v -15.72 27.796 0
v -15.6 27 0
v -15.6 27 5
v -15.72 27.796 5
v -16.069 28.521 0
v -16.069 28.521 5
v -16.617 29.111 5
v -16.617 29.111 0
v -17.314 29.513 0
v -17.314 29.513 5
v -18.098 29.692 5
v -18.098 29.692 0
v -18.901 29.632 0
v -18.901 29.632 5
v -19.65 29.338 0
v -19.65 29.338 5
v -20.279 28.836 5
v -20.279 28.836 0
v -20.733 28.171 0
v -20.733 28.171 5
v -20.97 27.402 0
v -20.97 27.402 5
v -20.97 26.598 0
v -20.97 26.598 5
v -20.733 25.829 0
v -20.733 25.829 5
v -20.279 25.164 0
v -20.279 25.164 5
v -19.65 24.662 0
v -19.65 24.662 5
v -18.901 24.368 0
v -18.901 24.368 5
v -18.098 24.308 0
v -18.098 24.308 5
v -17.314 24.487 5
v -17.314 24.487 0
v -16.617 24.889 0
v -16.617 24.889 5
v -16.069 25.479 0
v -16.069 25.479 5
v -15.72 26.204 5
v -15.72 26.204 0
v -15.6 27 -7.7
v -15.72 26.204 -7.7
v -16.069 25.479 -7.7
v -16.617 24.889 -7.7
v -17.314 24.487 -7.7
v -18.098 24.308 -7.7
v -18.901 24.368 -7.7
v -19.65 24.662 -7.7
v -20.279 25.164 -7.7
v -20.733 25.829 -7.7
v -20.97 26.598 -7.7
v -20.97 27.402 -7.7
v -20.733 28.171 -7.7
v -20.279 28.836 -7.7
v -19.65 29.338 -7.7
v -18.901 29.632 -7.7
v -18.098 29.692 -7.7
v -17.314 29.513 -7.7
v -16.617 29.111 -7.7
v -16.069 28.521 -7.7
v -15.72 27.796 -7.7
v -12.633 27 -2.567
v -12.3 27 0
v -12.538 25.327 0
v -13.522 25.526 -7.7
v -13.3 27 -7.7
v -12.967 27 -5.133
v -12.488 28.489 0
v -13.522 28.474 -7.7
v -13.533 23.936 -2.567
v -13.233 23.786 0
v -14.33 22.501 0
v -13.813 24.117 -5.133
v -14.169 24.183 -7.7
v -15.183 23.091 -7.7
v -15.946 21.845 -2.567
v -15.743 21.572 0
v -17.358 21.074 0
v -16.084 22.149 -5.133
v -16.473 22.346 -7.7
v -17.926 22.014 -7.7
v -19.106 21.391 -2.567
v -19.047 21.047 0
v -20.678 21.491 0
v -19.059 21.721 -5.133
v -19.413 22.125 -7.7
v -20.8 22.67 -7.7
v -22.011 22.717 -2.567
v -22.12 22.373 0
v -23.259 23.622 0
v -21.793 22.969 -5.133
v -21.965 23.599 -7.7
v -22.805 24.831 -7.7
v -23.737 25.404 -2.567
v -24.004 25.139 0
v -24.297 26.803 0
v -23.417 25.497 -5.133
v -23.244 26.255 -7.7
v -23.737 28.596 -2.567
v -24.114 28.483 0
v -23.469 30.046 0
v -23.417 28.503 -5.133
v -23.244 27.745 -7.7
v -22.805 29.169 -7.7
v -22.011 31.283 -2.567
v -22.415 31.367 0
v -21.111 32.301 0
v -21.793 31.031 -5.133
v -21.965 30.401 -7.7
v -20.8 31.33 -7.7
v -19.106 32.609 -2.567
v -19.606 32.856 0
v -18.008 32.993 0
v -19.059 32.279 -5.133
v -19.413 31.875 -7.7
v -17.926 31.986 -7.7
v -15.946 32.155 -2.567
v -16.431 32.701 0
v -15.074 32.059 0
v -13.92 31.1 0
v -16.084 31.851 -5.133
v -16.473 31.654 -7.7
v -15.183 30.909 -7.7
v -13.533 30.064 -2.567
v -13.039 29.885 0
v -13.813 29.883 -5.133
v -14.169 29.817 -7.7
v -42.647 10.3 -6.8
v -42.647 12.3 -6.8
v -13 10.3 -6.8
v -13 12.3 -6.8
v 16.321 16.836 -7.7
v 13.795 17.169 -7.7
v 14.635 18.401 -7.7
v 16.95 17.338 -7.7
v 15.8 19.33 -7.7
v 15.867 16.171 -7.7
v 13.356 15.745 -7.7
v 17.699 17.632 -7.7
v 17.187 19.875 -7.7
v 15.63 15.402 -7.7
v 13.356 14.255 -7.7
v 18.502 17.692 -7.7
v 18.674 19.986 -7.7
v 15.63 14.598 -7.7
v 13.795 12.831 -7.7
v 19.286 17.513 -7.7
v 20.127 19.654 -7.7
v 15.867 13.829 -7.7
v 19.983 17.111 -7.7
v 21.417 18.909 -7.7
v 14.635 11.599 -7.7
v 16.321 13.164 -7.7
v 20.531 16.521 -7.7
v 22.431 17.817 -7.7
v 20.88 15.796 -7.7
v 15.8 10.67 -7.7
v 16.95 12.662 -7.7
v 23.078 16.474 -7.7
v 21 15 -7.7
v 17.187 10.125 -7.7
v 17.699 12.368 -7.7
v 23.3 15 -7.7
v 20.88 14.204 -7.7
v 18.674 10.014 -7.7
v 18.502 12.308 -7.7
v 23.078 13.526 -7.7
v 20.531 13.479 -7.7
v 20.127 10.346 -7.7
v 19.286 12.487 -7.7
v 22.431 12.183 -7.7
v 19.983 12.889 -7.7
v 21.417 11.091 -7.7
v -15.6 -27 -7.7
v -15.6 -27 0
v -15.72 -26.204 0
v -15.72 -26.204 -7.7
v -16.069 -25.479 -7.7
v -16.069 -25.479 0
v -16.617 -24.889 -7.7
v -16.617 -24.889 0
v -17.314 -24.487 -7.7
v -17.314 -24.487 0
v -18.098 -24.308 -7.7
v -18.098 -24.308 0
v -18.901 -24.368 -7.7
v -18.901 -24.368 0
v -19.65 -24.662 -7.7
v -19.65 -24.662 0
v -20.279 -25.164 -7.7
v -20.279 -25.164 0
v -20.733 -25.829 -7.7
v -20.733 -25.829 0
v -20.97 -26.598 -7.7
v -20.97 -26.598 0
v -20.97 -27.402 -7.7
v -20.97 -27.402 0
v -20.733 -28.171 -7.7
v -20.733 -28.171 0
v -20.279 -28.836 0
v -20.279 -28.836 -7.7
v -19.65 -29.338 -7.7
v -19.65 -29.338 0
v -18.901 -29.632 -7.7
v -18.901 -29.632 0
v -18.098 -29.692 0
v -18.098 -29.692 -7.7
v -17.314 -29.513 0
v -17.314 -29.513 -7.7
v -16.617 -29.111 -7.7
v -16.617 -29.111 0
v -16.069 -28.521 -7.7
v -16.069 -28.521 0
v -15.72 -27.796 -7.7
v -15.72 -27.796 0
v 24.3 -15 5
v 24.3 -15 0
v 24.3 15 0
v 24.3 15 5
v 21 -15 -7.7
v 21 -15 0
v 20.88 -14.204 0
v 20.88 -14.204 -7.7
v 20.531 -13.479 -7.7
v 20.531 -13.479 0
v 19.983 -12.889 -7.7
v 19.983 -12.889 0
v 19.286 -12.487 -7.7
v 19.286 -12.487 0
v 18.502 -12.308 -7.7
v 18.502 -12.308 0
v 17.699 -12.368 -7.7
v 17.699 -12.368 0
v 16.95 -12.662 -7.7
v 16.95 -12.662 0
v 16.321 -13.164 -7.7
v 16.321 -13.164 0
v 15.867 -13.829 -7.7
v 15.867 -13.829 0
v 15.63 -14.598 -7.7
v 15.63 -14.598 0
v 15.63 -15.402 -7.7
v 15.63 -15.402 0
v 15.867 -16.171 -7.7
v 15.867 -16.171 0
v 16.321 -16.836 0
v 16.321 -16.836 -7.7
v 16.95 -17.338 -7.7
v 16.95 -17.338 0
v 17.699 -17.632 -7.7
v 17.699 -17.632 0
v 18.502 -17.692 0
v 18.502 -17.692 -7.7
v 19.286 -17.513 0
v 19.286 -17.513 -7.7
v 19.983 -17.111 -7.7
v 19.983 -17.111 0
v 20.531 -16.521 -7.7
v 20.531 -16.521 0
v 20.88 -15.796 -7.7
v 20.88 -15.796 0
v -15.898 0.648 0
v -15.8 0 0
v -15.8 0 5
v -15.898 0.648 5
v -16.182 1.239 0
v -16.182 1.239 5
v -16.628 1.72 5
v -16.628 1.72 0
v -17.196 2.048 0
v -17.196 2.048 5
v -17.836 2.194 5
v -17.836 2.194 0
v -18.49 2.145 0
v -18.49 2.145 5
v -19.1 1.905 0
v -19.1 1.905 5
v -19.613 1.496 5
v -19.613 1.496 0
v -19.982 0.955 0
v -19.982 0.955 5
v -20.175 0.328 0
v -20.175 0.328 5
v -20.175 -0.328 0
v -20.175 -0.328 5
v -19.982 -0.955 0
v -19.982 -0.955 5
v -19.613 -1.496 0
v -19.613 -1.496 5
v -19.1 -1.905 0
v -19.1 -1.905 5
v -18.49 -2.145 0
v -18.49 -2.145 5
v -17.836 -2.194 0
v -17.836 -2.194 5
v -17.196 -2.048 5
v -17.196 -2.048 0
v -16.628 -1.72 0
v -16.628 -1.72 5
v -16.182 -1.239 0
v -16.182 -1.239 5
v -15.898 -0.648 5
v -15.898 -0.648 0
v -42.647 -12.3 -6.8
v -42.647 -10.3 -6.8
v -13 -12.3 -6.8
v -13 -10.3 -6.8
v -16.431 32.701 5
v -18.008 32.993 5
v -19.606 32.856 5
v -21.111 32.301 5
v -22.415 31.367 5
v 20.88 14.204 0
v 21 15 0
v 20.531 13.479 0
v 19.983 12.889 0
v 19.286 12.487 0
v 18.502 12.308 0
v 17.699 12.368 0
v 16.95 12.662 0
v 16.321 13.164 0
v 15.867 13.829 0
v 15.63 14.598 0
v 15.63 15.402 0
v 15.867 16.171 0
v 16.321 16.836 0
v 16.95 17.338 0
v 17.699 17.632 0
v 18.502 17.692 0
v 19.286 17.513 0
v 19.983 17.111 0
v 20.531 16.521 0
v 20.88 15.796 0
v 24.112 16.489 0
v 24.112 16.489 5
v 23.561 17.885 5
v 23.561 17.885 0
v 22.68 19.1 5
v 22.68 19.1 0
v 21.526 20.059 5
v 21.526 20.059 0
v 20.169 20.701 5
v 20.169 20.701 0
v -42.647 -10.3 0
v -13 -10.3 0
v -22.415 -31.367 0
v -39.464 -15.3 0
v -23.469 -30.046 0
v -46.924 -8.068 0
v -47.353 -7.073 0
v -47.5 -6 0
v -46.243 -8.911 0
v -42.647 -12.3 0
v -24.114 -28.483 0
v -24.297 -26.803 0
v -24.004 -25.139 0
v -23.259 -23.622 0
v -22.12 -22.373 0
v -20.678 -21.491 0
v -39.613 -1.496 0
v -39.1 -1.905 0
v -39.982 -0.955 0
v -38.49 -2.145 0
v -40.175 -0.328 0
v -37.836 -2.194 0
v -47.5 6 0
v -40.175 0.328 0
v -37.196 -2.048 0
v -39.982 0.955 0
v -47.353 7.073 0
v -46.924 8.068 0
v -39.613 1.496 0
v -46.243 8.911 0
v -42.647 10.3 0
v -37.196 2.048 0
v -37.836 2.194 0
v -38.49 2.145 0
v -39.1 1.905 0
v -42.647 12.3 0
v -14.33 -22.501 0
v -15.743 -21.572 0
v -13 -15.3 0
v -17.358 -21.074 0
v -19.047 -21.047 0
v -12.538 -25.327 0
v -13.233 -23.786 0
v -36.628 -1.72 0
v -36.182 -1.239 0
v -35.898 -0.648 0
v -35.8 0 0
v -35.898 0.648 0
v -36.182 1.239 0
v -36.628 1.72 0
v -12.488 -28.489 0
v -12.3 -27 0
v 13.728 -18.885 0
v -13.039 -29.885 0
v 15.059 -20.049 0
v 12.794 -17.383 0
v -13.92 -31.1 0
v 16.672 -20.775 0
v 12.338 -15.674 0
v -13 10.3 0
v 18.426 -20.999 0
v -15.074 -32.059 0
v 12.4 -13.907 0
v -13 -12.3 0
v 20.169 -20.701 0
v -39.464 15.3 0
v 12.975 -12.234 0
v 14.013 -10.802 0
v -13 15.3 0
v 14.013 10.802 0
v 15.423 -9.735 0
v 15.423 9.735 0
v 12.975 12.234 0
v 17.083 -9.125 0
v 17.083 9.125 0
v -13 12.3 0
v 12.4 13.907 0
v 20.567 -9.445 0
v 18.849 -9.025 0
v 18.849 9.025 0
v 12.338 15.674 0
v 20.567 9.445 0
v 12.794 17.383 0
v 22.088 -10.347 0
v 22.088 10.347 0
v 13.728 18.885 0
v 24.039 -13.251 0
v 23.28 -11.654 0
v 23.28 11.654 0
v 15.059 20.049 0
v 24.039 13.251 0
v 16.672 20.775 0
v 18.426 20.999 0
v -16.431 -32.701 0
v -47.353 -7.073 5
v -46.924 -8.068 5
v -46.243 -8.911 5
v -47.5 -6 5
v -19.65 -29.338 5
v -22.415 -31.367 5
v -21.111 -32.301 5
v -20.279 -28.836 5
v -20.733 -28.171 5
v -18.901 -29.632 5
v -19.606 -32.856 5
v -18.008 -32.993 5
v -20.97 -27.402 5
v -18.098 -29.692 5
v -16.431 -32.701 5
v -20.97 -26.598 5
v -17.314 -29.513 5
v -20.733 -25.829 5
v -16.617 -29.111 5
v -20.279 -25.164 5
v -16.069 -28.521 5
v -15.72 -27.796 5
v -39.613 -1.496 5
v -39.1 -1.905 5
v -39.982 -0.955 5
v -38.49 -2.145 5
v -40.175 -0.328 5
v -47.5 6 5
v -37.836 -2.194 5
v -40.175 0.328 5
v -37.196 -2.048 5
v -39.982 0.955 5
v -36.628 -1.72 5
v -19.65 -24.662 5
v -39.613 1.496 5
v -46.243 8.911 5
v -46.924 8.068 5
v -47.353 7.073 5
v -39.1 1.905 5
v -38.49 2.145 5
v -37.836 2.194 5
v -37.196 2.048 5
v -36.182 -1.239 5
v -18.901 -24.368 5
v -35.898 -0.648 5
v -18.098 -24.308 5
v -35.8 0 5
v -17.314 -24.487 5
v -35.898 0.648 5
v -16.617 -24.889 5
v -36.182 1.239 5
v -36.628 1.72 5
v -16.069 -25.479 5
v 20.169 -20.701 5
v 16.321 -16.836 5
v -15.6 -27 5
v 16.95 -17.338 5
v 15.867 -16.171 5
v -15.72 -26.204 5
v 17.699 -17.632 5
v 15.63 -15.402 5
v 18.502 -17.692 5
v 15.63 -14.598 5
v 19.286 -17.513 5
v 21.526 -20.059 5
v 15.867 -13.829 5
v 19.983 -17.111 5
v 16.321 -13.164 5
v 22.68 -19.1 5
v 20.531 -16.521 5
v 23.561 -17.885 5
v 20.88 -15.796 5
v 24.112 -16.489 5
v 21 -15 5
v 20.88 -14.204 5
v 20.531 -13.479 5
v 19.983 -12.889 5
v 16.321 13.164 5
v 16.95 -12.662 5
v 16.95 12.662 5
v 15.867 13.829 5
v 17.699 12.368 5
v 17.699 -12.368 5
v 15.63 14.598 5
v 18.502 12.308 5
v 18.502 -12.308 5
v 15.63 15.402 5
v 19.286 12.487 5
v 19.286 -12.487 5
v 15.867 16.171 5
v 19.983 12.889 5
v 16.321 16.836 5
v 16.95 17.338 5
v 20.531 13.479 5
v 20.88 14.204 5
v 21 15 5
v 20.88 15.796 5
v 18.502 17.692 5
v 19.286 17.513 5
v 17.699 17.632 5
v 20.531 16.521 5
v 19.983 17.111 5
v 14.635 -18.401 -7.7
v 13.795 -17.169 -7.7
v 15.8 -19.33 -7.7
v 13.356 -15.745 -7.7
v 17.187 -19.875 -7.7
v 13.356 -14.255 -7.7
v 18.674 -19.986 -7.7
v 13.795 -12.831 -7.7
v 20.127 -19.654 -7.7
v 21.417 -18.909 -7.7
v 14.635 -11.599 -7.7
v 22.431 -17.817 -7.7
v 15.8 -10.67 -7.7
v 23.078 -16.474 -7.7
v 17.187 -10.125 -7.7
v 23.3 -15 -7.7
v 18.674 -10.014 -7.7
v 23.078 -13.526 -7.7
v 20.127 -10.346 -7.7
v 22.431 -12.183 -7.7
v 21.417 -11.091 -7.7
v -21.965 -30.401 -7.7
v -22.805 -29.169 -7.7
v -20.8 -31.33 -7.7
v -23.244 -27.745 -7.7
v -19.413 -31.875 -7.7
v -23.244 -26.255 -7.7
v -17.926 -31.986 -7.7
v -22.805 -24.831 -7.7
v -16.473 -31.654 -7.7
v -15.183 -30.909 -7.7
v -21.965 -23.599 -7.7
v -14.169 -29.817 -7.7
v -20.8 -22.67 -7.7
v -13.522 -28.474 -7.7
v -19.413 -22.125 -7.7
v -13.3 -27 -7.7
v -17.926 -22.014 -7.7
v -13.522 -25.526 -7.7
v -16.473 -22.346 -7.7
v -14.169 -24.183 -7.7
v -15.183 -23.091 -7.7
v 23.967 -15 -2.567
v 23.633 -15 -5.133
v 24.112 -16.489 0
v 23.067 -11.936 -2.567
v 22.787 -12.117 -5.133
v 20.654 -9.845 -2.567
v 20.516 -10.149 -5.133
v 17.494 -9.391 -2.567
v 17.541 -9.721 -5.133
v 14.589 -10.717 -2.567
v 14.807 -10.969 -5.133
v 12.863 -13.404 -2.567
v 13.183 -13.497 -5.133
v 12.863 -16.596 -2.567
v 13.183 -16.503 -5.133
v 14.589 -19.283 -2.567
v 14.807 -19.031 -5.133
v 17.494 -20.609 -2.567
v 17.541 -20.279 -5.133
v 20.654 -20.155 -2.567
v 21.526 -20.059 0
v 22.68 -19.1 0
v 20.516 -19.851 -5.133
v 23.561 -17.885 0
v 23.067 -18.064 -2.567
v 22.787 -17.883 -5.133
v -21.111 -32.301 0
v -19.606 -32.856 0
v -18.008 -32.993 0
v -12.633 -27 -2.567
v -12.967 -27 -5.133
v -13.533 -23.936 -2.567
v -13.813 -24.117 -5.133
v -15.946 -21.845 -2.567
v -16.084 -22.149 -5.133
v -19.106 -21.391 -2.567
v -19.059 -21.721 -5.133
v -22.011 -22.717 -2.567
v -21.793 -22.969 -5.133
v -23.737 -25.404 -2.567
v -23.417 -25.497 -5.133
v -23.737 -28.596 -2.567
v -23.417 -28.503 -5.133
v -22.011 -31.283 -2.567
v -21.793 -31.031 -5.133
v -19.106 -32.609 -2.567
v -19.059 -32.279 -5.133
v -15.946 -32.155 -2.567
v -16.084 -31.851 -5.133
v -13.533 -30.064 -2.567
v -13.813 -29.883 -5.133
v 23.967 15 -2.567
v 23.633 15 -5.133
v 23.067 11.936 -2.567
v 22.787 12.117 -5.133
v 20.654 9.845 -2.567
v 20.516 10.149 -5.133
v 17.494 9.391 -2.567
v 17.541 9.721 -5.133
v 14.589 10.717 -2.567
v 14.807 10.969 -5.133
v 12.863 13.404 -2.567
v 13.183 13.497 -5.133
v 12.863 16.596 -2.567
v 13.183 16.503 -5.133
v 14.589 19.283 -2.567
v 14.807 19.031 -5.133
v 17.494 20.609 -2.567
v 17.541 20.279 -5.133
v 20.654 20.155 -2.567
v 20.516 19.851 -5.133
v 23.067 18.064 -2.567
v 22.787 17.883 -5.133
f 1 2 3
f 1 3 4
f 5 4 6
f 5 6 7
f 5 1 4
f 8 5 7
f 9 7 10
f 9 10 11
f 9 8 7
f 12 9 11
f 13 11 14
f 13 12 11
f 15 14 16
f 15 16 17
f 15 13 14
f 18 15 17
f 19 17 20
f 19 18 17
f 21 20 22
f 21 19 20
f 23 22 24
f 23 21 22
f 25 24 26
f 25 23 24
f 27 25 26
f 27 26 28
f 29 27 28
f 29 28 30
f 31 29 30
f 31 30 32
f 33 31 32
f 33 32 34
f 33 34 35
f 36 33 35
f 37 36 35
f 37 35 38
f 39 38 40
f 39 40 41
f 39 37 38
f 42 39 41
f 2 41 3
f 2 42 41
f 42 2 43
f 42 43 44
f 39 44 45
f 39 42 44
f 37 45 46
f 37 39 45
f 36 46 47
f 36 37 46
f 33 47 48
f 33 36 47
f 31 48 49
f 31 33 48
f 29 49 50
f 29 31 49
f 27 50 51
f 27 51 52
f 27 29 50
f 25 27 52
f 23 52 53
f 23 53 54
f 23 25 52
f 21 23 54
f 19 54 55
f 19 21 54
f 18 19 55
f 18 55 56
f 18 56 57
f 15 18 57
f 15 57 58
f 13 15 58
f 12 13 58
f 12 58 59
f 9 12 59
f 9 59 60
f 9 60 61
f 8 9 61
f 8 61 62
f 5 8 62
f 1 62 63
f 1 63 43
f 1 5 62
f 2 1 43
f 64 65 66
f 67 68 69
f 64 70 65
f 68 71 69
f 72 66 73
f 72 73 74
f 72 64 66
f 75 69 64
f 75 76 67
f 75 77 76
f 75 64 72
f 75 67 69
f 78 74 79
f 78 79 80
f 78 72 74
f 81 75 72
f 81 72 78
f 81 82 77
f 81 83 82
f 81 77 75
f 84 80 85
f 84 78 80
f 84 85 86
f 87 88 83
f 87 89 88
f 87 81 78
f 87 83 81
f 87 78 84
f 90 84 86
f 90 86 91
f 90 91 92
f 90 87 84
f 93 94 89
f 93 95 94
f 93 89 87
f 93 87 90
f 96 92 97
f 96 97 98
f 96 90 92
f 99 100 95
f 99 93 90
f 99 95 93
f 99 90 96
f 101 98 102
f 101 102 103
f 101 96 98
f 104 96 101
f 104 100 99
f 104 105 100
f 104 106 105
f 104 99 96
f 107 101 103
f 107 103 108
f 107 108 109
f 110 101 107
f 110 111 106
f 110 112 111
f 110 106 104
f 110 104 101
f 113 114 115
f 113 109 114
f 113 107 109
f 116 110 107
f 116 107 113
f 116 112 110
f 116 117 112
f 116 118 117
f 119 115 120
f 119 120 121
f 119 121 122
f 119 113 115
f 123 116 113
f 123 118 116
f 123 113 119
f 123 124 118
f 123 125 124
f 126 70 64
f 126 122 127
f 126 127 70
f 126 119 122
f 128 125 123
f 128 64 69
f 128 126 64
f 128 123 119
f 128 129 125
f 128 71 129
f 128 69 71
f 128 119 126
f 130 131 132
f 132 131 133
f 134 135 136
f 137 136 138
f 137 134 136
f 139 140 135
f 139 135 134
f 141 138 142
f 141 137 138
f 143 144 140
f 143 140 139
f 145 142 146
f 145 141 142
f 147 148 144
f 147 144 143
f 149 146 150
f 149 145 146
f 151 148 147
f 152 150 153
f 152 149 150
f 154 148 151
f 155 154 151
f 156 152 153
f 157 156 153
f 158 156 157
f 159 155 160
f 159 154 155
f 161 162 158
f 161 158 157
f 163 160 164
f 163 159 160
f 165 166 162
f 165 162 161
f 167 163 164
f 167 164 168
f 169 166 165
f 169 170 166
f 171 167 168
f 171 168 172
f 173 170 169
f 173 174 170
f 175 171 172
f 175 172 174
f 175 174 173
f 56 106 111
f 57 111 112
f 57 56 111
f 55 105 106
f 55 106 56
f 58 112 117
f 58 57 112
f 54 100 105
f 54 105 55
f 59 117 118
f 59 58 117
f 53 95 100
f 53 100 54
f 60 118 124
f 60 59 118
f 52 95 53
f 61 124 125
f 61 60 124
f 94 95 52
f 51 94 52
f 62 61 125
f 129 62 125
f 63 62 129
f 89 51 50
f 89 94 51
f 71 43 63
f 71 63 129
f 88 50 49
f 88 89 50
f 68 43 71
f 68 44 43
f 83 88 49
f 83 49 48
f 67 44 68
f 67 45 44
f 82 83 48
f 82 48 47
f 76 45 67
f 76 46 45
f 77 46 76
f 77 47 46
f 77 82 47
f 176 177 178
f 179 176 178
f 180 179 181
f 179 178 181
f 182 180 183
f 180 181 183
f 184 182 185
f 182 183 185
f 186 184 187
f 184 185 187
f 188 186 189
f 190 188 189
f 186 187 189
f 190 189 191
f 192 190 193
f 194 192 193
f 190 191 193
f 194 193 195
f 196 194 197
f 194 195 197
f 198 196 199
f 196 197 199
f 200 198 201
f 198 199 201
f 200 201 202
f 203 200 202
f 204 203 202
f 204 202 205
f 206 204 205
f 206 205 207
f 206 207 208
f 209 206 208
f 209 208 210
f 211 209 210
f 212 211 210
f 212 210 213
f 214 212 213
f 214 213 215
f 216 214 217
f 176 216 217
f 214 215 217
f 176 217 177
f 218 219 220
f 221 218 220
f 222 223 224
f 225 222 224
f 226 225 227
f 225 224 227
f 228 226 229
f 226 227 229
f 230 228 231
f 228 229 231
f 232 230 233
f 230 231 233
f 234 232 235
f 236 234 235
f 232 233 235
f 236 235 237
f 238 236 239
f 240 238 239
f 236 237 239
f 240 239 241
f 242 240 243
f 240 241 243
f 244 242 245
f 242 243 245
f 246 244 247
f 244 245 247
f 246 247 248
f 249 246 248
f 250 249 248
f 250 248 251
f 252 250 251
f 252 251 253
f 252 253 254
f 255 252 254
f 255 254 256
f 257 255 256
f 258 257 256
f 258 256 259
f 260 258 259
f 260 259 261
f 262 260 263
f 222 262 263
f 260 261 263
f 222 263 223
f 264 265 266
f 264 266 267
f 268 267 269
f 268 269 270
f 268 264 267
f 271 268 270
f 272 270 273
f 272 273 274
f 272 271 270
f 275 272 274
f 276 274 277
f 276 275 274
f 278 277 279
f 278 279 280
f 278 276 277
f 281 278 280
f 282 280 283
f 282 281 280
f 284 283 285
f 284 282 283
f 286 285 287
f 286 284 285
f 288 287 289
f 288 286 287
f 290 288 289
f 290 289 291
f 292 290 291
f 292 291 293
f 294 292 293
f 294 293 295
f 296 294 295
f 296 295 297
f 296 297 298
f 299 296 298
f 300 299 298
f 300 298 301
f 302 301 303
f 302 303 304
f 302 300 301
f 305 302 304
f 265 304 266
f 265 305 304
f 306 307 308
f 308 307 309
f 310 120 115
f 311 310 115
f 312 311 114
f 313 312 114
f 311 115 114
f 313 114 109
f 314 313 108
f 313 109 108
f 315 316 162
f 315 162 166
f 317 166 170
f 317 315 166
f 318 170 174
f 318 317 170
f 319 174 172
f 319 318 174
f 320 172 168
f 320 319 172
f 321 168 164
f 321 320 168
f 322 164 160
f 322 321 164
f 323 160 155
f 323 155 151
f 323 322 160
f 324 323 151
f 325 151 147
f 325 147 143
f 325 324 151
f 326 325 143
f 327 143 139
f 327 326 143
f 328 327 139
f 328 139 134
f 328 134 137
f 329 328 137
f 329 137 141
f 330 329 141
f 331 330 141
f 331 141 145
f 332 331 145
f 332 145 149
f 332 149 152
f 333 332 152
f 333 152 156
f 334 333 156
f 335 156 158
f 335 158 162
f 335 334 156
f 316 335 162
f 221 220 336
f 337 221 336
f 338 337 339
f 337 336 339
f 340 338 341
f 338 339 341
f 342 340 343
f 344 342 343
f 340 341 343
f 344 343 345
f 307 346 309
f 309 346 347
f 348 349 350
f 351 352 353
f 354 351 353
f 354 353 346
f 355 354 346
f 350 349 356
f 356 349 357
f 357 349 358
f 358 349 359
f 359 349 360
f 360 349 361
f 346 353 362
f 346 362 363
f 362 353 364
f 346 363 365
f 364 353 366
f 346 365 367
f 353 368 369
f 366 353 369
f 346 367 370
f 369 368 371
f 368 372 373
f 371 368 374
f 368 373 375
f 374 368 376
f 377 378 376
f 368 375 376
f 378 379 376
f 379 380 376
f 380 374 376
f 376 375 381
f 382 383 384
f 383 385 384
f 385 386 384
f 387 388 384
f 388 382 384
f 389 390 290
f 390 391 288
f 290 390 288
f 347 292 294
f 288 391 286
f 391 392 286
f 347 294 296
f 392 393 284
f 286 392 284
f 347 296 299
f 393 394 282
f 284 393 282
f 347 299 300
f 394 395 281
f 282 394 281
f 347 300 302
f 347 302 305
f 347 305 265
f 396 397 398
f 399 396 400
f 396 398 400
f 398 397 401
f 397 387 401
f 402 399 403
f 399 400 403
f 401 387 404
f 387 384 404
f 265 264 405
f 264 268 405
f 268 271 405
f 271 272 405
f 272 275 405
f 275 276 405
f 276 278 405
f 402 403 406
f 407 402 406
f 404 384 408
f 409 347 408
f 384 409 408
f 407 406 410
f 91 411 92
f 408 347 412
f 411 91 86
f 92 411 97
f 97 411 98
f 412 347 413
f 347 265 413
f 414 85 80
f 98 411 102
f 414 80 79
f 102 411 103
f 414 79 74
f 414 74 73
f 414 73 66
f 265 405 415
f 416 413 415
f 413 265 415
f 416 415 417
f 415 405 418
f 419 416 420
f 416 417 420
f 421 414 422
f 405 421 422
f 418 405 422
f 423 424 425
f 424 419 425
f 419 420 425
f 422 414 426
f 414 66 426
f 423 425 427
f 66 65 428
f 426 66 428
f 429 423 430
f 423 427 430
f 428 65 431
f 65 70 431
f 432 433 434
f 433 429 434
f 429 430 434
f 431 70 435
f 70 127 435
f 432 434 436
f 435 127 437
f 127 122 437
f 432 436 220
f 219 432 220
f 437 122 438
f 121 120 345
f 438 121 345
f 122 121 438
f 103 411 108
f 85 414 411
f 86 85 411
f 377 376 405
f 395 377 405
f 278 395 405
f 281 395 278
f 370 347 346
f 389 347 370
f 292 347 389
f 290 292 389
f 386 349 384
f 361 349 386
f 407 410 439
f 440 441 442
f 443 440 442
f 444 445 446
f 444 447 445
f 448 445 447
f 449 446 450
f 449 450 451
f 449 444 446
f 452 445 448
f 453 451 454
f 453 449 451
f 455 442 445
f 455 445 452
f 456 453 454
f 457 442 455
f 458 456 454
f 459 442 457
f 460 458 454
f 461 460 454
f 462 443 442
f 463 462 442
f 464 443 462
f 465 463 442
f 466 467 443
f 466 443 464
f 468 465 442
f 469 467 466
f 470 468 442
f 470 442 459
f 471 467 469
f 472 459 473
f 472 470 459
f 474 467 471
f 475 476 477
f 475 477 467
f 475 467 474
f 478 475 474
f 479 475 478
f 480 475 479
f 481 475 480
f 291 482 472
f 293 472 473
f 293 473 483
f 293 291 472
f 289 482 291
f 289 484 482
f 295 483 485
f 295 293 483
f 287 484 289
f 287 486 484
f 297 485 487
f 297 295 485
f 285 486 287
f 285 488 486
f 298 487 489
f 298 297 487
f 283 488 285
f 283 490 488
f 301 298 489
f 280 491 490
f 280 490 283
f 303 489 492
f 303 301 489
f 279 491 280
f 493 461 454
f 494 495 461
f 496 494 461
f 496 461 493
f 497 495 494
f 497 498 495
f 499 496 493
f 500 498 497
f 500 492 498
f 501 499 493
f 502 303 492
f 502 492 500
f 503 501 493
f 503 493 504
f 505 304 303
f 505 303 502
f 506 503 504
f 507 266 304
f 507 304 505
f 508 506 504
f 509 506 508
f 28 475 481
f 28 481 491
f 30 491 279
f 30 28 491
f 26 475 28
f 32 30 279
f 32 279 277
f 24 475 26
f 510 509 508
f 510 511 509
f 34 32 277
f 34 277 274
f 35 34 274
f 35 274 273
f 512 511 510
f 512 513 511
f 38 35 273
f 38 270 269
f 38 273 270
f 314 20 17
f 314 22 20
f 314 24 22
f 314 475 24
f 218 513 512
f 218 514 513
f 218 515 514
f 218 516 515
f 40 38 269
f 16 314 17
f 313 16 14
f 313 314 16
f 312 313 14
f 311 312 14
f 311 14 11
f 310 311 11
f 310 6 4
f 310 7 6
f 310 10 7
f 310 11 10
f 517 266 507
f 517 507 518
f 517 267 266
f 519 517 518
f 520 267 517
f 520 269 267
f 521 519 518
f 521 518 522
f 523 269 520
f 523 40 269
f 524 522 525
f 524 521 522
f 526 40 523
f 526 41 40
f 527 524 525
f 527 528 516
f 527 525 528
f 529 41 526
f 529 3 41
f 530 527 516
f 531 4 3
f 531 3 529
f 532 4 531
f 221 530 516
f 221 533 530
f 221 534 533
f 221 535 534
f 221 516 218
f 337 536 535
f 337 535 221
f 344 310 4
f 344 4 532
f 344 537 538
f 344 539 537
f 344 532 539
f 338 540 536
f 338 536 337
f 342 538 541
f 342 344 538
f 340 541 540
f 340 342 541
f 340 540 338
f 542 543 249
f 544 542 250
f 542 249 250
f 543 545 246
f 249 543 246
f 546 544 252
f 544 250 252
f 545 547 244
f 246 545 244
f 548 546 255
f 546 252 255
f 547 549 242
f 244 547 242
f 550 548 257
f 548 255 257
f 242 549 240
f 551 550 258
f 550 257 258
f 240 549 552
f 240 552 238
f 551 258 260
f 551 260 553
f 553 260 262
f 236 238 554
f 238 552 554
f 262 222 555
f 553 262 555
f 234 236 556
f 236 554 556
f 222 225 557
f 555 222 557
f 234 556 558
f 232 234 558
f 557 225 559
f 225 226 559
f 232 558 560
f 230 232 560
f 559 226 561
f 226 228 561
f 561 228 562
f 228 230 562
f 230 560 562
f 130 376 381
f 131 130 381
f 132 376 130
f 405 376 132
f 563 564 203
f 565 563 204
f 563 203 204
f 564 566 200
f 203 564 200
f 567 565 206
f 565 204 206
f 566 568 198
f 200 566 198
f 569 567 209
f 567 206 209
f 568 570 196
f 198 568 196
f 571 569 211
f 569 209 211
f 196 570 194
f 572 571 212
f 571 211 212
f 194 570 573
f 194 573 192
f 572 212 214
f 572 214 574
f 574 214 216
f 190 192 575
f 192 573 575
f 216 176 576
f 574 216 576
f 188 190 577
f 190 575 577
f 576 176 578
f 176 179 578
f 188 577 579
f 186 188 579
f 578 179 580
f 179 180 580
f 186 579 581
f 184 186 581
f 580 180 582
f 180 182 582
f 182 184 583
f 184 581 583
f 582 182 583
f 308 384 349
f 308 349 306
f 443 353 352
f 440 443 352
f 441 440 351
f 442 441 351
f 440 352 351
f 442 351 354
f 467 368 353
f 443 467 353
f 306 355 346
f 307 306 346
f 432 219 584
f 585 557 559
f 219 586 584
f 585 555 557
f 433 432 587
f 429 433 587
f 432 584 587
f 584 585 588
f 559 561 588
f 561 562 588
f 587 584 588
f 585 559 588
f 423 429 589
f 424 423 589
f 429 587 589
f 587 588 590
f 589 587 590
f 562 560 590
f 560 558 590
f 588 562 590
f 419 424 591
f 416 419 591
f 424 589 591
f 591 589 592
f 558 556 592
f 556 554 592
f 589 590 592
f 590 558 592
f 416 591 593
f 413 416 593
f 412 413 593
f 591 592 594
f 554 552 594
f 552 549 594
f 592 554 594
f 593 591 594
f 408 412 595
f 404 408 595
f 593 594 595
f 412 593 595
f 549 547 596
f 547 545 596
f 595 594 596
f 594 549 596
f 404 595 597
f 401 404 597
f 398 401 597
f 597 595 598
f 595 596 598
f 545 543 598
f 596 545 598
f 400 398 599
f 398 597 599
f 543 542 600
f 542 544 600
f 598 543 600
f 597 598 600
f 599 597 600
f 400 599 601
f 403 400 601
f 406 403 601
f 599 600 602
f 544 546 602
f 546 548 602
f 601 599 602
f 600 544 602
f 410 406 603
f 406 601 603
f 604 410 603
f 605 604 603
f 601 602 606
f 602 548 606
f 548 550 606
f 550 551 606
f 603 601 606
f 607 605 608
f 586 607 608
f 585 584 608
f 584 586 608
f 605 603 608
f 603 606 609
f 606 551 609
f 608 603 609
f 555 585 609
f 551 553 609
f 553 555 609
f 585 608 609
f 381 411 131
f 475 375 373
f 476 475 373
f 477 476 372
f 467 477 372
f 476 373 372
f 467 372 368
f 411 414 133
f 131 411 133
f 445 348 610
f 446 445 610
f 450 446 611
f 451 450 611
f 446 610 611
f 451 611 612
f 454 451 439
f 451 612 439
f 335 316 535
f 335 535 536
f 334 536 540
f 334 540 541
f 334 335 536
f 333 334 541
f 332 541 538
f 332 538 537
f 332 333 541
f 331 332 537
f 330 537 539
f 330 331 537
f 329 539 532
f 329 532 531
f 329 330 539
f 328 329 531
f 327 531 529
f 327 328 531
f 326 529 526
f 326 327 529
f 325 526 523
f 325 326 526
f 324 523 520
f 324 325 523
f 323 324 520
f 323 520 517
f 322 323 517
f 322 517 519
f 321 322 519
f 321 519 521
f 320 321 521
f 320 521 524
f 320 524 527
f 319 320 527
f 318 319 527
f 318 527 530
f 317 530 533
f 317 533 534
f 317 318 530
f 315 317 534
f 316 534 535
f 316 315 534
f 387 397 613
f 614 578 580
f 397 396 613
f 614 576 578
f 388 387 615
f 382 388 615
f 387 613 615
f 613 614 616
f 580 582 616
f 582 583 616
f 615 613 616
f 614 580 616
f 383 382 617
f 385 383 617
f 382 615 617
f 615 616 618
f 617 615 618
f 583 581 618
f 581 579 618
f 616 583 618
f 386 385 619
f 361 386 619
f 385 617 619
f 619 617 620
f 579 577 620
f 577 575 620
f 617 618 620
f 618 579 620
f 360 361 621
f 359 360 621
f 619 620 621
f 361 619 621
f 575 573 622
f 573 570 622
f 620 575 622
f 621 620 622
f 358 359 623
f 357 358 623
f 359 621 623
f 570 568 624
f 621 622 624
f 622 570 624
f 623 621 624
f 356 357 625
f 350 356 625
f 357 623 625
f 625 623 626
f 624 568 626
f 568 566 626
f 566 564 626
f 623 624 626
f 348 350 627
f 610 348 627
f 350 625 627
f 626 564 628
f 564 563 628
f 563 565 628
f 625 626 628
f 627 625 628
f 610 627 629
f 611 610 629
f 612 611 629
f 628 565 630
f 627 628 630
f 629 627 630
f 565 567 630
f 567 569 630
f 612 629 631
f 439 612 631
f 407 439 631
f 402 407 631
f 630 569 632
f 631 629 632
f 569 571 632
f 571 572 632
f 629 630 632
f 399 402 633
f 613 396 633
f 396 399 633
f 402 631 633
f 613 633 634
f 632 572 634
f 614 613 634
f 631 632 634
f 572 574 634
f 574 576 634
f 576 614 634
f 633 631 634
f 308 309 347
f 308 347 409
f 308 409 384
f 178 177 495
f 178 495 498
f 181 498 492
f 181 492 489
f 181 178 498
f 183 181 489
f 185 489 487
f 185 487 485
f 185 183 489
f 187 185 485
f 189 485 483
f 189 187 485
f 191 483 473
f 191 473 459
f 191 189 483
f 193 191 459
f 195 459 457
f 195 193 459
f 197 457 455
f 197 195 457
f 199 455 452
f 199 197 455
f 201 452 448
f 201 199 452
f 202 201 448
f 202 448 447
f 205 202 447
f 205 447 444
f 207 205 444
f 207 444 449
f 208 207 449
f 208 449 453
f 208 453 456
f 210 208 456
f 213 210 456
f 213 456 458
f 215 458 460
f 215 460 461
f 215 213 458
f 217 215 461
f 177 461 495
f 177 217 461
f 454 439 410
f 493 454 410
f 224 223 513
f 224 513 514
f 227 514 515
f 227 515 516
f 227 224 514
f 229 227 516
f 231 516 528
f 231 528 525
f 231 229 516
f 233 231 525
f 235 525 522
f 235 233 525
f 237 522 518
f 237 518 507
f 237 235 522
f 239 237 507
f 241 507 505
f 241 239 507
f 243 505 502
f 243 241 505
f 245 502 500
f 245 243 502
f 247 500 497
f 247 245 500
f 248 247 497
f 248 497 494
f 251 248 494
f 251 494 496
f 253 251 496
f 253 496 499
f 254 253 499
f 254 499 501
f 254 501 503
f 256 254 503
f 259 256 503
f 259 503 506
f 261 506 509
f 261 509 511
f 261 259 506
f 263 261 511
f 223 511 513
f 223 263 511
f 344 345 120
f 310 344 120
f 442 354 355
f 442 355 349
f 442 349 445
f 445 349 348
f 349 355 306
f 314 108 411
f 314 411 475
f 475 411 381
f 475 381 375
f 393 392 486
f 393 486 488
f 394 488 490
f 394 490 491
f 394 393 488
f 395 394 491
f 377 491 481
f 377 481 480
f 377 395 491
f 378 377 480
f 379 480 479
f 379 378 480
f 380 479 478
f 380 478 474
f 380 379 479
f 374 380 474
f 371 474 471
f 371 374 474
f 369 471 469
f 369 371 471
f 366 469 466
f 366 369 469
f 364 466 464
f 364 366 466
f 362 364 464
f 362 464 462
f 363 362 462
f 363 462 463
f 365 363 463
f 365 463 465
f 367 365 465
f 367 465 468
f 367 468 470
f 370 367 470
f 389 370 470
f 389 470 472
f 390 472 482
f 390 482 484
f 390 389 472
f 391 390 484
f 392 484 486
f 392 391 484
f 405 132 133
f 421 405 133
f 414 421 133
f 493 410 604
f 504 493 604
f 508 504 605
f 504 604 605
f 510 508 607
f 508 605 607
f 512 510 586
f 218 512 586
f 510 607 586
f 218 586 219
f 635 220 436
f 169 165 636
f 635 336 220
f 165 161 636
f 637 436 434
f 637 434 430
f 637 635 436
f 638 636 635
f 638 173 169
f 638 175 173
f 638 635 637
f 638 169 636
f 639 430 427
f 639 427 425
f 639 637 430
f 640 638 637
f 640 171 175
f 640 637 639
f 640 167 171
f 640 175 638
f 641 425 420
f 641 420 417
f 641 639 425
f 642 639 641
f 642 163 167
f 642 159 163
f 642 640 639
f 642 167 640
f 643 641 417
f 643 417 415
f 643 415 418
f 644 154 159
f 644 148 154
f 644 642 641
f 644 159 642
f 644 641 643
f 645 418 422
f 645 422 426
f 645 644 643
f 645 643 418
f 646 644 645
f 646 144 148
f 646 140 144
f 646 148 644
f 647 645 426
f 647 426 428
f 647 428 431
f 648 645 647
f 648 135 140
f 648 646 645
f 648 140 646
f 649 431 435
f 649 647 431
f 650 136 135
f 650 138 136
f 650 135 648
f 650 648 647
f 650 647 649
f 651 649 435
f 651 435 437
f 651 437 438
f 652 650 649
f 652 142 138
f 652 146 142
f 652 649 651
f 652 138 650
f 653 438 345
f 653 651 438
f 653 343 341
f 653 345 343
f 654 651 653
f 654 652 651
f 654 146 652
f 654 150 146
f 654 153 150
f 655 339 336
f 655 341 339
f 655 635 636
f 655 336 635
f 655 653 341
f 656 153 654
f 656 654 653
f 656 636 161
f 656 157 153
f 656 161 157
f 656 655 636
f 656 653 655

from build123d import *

# Parameters (mm, degrees)
SKETCH_1_R       = 2.7
SKETCH_1_R_2     = 2.2
EXTRUDE_1_DEPTH  = 5
SKETCH_1_4_W     = 29.647183795
SKETCH_1_4_H     = 2
EXTRUDE_2_DEPTH  = 6.8
CHAMFER_1_SIZE   = 3
CHAMFER_1_SIZE_2 = 6.8
CHAMFER_2_SIZE   = 3
CHAMFER_2_SIZE_2 = 6.8


with BuildPart() as part:
    # 草图1 → 凸台-拉伸1 (new body)
    with BuildSketch(Plane.XY):
        with BuildLine():
            Line((-22.414990858, 31.366560458), (-46.243327239, 8.911040306))
            ThreePointArc((-46.243327239, 8.911040306), (-47.17241807, 7.585353438), (-47.5, 6))
            Line((-47.5, 6), (-47.5, -6))
            ThreePointArc((-47.5, -6), (-47.17241807, -7.585353438), (-46.243327239, -8.911040306))
            Line((-46.243327239, -8.911040306), (-22.414990858, -31.366560458))
            ThreePointArc((-22.414990858, -31.366560458), (-19.606220239, -32.85608988), (-16.430695985, -32.701377246))
            Line((-16.430695985, -32.701377246), (20.169304015, -20.701377246))
            ThreePointArc((20.169304015, -20.701377246), (23.158797387, -18.520239758), (24.3, -15))
            Line((24.3, -15), (24.3, 15))
            ThreePointArc((24.3, 15), (23.158797387, 18.520239758), (20.169304015, 20.701377246))
            Line((20.169304015, 20.701377246), (-16.430695985, 32.701377246))
            ThreePointArc((-16.430695985, 32.701377246), (-19.606220239, 32.85608988), (-22.414990858, 31.366560458))
        make_face()
        with Locations((18.3, -15)):
            Circle(SKETCH_1_R, mode=Mode.SUBTRACT)
        with Locations((-38, 0)):
            Circle(SKETCH_1_R_2, mode=Mode.SUBTRACT)
        with Locations((-18, 0)):
            Circle(SKETCH_1_R_2, mode=Mode.SUBTRACT)
        with Locations((-18.3, 27)):
            Circle(SKETCH_1_R, mode=Mode.SUBTRACT)
        with Locations((18.3, 15)):
            Circle(SKETCH_1_R, mode=Mode.SUBTRACT)
        with Locations((-18.3, -27)):
            Circle(SKETCH_1_R, mode=Mode.SUBTRACT)
    extrude(amount=EXTRUDE_1_DEPTH)

    # 草图4 → 旋转1 (revolve)
    with BuildSketch(Plane(origin=(6.216937636, 18.961659791, 0), x_dir=(-0.9502295409734977, 0.31155066917163887, 0), z_dir=(-0.31155066917163887, -0.9502295409734977, 0)), mode=Mode.PRIVATE) as revolve_1_sk:
        Polygon((-6.715940562, 0), (-7.715940562, 7.7), (-10.015940562, 7.7), (-10.015940562, 0), align=None)
    revolve_1 = revolve(revolve_1_sk.sketch.rotate(Axis((18.3, 15, 4.45283877), (0, 0, -1)), 161.847294113), axis=Axis((18.3, 15, 4.45283877), (0, 0, -1)))

    # 草图4<3> → 旋转2 (revolve)
    with BuildSketch(Plane(origin=(6.216937636, 18.961659791, 0), x_dir=(-0.9502295409734977, 0.31155066917163887, 0), z_dir=(-0.31155066917163887, -0.9502295409734977, 0)), mode=Mode.PRIVATE) as revolve_2_sk:
        Polygon((30.801068667, 7.7), (28.501068667, 7.7), (28.501068667, 0), (31.801068667, 0), align=None)
    revolve_2 = revolve(revolve_2_sk.sketch.rotate(Axis((-18.3, 27, 0), (0, 0, -1)), 161.847294113), axis=Axis((-18.3, 27, 0), (0, 0, -1)))

    # 镜向1: 旋转1, 旋转2 across plane
    add(revolve_1.mirror(Plane.ZX))
    add(revolve_2.mirror(Plane.ZX))

    # 草图1<4> → 凸台-拉伸2 (add)
    with BuildSketch(Plane.XY):
        with Locations((-27.823591898, 11.3)):
            Rectangle(SKETCH_1_4_W, SKETCH_1_4_H)
        with Locations((-27.823591898, -11.3)):
            Rectangle(SKETCH_1_4_W, SKETCH_1_4_H)
    extrude(amount=-EXTRUDE_2_DEPTH)

    # 倒角1
    # the kernel refuses this chamfer: 6.8, 3 mm, written as the material it adds along each edge
    with BuildSketch(Plane(origin=(-13, 12.3, 0), x_dir=(0, 0.9968133817371192, 0.07976892872421078), z_dir=(-1, 0, 0))) as chamfer_1_piece_1_section:
        Polygon((CHAMFER_1_SIZE * 0.996813381737, CHAMFER_1_SIZE * 0.0797689287242), (-CHAMFER_1_SIZE_2 * 0.0797689287242, CHAMFER_1_SIZE_2 * 0.996813381737), (0, 0), align=None)
    chamfer_1_piece_1 = extrude(amount=29.647183795, mode=Mode.PRIVATE)
    chamfer_1_piece_1 = split(chamfer_1_piece_1, bisect_by=Plane(origin=(-34.073753533, 20.379491281, -2.31410284), z_dir=(0.685831809699718, -0.7277600764015637, 0)), keep=Keep.TOP, mode=Mode.PRIVATE)
    chamfer_1_piece_1 = split(chamfer_1_piece_1, bisect_by=Plane(origin=(-27.32988888, 13.223341061, -6.8), z_dir=(0, 0, 1)), keep=Keep.TOP, mode=Mode.PRIVATE)
    add(chamfer_1_piece_1)

    # 倒角2
    # the kernel refuses this chamfer: 6.8, 3 mm, written as the material it adds along each edge
    with BuildSketch(Plane(origin=(-42.647183795, -12.3, 0), x_dir=(0, -0.9968133817371192, 0.07976892872421078), z_dir=(1, 0, 0))) as chamfer_2_piece_1_section:
        Polygon((CHAMFER_2_SIZE * 0.996813381737, CHAMFER_2_SIZE * 0.0797689287242), (-CHAMFER_2_SIZE_2 * 0.0797689287242, CHAMFER_2_SIZE_2 * 0.996813381737), (0, 0), align=None)
    chamfer_2_piece_1 = extrude(amount=29.647183795, mode=Mode.PRIVATE)
    chamfer_2_piece_1 = split(chamfer_2_piece_1, bisect_by=Plane(origin=(-34.073753533, -20.379491281, -2.31410284), z_dir=(0.6858318096997175, 0.7277600764015641, 0)), keep=Keep.TOP, mode=Mode.PRIVATE)
    chamfer_2_piece_1 = split(chamfer_2_piece_1, bisect_by=Plane(origin=(-27.32988888, -13.223341061, -6.8), z_dir=(0, 0, 1)), keep=Keep.TOP, mode=Mode.PRIVATE)
    add(chamfer_2_piece_1)


solid = part.part
